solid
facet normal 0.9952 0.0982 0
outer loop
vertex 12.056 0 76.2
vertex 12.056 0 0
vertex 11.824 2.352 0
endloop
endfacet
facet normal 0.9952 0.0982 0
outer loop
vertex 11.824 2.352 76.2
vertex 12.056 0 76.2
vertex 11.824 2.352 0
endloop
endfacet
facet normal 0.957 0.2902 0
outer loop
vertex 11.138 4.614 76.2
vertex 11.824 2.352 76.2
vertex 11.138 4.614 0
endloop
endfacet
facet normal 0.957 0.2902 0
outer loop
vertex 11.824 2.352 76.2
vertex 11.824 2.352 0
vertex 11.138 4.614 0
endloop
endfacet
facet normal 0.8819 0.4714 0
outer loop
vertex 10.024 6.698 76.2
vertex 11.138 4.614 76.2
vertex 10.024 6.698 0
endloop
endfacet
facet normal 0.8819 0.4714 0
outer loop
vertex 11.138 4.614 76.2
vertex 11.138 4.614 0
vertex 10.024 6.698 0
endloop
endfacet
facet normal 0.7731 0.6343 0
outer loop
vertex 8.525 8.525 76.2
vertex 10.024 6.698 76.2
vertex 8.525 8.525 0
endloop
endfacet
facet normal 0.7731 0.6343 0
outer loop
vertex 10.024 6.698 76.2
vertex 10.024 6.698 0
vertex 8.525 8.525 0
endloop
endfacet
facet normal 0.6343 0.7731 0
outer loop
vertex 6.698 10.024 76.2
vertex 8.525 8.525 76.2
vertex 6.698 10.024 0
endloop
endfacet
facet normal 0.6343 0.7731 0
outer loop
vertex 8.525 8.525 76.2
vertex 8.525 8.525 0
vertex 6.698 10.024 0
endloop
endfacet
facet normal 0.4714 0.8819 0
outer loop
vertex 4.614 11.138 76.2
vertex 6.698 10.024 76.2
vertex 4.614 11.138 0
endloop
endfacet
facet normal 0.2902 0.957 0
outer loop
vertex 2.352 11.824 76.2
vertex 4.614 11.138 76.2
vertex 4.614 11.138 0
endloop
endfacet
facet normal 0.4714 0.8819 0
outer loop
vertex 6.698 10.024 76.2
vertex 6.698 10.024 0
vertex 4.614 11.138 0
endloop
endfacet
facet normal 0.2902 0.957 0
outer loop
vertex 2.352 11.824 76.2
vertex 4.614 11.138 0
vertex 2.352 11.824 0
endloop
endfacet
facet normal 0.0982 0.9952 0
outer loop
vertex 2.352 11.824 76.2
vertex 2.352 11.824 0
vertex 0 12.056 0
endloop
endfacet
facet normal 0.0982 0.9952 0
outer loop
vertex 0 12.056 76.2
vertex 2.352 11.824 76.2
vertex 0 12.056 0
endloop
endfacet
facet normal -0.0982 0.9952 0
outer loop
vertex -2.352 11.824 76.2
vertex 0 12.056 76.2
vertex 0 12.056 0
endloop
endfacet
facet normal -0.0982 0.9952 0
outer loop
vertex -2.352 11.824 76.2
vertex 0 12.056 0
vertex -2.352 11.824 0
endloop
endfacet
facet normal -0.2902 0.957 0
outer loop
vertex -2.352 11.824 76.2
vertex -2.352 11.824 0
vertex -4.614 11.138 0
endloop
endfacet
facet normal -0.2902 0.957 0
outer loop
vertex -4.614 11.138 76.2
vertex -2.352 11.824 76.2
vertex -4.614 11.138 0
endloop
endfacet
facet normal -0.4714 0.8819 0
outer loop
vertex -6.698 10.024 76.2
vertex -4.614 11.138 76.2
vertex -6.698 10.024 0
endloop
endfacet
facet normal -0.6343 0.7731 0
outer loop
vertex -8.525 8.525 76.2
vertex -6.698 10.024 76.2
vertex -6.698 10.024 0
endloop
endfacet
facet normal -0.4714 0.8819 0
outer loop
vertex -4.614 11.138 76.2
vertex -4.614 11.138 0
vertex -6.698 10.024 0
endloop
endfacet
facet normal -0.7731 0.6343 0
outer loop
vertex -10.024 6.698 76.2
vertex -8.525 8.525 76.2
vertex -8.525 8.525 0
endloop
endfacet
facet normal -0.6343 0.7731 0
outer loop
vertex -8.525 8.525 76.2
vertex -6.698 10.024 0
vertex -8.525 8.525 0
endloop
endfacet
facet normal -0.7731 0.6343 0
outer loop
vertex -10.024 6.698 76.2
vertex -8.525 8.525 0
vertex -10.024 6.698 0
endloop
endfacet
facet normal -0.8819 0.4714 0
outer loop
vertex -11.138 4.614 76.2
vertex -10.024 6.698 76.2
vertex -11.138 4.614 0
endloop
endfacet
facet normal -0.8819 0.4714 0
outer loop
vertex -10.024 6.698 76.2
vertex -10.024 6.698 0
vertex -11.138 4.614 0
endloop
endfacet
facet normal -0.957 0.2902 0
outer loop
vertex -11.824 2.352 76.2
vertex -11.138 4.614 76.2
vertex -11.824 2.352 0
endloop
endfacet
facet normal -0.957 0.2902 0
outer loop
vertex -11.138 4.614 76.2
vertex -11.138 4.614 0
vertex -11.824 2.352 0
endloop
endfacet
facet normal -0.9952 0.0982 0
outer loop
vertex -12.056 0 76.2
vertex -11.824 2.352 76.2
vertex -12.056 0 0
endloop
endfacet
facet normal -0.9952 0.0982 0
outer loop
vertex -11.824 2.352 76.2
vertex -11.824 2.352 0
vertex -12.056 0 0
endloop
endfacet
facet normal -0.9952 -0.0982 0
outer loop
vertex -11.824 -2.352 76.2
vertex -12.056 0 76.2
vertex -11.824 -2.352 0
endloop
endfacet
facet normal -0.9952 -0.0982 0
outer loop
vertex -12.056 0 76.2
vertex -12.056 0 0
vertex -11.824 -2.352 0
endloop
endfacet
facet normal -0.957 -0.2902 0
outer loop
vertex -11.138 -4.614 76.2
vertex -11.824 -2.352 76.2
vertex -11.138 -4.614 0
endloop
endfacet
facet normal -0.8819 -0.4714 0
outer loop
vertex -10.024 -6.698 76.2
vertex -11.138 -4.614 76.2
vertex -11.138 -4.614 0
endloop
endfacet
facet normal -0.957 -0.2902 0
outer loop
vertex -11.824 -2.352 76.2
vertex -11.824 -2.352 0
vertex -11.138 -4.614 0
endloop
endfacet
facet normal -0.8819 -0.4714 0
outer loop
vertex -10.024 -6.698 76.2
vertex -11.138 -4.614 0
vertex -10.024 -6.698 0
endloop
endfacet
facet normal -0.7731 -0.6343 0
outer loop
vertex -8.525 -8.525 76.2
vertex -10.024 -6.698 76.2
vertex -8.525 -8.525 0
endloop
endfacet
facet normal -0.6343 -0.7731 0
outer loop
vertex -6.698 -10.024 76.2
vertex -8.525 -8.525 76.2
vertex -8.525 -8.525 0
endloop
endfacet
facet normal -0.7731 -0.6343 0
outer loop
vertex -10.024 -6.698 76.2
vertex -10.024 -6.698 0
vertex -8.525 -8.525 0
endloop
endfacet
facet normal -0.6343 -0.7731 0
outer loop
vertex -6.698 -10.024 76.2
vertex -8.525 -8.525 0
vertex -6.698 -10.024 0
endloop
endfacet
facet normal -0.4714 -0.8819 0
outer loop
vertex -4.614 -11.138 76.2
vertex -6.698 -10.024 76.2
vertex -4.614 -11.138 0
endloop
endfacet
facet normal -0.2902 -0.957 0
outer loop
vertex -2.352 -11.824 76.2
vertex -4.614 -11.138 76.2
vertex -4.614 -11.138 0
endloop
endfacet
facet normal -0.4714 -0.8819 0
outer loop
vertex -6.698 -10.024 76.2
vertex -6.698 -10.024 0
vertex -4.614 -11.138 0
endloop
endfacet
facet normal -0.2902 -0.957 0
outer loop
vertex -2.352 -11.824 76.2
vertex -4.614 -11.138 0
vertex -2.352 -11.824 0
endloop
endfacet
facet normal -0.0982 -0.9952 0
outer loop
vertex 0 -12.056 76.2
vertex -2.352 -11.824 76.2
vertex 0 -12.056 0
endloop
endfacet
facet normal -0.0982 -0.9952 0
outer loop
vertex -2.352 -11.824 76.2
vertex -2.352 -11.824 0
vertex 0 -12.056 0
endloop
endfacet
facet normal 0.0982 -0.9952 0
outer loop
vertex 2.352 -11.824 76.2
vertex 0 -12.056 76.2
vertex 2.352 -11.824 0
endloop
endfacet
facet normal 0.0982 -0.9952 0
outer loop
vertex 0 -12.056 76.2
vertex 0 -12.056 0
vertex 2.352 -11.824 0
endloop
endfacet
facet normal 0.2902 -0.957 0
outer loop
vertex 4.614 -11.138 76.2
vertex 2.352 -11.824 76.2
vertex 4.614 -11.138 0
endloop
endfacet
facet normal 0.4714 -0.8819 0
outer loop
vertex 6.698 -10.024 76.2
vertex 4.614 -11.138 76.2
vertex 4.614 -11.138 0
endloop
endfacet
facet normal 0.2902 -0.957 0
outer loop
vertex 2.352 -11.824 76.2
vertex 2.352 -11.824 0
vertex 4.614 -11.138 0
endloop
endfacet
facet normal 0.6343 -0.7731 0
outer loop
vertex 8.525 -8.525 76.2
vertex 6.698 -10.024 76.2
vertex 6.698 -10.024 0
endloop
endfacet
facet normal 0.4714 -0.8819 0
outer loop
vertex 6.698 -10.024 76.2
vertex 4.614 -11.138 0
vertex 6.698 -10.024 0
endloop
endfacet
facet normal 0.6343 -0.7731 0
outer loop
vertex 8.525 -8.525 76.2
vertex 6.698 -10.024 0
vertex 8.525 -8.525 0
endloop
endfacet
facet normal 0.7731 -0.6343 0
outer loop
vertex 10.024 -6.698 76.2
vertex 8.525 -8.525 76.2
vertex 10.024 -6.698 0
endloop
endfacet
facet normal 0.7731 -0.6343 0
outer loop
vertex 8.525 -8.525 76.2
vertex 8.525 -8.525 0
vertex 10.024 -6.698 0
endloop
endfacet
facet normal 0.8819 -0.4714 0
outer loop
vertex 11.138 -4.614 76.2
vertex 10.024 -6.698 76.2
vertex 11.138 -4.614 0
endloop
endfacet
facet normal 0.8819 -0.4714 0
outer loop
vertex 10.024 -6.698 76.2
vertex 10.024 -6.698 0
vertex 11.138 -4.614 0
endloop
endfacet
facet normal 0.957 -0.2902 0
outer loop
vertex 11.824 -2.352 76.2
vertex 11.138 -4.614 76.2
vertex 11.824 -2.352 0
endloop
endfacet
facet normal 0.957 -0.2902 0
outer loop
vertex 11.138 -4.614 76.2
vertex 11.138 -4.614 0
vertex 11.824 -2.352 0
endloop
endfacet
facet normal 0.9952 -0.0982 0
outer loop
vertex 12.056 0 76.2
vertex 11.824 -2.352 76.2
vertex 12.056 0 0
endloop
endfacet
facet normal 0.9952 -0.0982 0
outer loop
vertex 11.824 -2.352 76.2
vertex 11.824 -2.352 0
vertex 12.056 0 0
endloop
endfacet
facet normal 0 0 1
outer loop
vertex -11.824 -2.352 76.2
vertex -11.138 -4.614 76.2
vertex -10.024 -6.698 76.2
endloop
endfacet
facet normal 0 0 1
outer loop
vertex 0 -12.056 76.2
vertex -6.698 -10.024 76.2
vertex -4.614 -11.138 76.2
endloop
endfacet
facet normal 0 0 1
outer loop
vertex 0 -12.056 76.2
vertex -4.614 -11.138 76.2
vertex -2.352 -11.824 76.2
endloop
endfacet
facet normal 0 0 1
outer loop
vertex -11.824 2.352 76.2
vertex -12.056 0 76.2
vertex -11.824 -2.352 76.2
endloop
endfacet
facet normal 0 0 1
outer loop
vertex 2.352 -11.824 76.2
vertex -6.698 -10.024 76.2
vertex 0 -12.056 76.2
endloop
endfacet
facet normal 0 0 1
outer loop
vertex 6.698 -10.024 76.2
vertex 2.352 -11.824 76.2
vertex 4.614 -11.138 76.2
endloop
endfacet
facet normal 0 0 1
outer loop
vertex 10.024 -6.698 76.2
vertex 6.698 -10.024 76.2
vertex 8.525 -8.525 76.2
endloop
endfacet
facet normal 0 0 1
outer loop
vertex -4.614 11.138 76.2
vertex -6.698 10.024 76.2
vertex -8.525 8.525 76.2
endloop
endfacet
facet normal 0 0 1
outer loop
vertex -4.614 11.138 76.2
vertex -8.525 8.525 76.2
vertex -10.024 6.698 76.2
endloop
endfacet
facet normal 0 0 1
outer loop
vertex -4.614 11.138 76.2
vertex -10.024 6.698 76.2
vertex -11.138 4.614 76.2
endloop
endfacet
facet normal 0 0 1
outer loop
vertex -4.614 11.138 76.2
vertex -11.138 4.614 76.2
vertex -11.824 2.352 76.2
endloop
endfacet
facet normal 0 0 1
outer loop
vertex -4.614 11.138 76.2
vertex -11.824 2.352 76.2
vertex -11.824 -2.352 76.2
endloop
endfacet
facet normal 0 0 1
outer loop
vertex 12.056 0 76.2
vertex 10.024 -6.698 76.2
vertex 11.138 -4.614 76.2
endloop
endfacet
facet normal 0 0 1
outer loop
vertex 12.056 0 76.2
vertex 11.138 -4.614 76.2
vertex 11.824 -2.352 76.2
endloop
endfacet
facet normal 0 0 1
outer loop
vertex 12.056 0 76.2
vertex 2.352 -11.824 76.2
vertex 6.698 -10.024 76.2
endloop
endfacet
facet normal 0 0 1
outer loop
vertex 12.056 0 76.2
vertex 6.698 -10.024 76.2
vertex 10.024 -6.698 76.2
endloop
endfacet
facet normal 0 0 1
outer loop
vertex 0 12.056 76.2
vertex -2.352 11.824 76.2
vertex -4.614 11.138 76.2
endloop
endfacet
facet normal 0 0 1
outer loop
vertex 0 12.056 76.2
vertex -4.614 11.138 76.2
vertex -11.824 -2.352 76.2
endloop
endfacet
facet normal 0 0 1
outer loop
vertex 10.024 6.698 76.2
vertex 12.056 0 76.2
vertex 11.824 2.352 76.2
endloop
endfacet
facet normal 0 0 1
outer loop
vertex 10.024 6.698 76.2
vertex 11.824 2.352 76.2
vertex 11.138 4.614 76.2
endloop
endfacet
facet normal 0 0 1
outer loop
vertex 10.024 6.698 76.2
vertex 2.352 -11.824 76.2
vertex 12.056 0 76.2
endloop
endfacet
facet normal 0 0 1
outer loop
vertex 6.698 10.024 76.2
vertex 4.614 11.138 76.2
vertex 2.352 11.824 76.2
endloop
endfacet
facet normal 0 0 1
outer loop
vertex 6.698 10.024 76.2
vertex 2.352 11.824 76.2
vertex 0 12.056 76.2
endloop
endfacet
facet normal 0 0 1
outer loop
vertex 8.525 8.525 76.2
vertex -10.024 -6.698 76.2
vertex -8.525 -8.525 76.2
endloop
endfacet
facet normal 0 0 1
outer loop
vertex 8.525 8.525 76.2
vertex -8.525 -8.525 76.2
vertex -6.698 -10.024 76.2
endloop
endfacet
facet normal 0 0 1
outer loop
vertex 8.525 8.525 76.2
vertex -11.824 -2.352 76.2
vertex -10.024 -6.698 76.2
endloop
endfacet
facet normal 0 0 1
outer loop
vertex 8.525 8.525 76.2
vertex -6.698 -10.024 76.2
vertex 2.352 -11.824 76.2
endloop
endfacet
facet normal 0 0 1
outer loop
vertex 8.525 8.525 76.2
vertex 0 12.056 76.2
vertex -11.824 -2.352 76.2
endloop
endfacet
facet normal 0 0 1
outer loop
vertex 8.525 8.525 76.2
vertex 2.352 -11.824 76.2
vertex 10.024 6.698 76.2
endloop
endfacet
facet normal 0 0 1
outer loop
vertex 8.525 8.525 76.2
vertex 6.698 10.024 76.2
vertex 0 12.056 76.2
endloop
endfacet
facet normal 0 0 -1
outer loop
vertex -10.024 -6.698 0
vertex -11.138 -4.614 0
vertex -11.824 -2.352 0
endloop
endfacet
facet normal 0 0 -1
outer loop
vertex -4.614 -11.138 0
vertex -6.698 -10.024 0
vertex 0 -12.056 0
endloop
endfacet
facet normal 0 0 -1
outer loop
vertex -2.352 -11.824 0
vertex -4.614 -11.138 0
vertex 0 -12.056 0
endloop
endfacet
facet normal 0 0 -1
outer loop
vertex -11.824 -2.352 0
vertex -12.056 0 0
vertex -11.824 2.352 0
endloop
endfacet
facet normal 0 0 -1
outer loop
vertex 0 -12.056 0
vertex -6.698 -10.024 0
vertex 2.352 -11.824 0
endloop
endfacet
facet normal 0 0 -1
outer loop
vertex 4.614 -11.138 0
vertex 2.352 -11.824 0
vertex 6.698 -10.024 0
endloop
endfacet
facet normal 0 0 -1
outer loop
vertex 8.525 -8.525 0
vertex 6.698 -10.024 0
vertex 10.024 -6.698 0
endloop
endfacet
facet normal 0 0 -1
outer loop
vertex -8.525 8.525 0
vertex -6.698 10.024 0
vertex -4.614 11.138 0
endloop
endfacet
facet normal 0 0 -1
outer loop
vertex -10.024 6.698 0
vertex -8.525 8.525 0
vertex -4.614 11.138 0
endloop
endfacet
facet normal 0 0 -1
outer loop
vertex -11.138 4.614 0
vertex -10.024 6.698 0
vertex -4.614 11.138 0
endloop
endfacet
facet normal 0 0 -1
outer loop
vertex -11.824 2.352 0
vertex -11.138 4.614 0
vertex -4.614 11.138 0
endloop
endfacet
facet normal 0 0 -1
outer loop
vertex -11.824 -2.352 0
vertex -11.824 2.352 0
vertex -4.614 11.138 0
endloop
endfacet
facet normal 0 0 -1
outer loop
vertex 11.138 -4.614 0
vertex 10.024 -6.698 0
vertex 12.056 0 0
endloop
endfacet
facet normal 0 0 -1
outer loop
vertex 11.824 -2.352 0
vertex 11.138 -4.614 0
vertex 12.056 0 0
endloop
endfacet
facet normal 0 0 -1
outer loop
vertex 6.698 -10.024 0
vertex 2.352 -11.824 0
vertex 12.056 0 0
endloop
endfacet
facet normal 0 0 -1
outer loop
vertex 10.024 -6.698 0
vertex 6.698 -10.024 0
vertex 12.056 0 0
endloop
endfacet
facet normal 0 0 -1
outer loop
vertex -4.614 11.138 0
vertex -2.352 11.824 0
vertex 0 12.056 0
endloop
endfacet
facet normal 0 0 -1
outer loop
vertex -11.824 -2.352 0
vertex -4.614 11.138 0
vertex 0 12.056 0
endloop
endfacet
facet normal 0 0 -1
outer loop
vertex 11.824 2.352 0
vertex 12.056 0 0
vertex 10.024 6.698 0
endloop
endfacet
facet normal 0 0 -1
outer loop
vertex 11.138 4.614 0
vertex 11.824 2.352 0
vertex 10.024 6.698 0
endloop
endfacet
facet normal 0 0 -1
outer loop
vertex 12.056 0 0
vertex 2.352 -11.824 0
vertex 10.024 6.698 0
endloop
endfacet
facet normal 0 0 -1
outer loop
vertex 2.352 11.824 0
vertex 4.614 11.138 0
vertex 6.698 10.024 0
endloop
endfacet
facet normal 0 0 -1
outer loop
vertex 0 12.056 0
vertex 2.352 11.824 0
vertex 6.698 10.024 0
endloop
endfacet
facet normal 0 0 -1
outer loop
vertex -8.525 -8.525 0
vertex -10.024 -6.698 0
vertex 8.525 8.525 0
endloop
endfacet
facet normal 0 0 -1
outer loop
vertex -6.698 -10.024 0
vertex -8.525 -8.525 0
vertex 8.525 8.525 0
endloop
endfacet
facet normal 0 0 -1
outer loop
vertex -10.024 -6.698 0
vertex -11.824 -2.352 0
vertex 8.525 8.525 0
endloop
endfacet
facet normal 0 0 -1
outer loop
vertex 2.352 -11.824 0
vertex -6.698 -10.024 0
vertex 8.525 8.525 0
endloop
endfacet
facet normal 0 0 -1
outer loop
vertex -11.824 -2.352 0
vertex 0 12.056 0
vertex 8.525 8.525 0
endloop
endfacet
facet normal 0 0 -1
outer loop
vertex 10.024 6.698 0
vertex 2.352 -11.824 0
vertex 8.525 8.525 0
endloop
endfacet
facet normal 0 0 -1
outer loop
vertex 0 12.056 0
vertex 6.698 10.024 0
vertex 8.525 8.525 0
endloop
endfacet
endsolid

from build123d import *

# Parameters (mm, degrees)
F0_R     = 12.0559653511
F1_DEPTH = 101.6
F3_DEPTH = 76.2


with BuildPart() as f1:
    # F0 (on Top) → F1 (new body)
    with BuildSketch(Plane.XY):
        Circle(F0_R)
    extrude(amount=F1_DEPTH)


with BuildPart() as f3:
    # F0 (on Top) → F3 (new body)
    with BuildSketch(Plane.XY):
        Circle(F0_R)
    extrude(amount=F3_DEPTH)


solid = f3.part
